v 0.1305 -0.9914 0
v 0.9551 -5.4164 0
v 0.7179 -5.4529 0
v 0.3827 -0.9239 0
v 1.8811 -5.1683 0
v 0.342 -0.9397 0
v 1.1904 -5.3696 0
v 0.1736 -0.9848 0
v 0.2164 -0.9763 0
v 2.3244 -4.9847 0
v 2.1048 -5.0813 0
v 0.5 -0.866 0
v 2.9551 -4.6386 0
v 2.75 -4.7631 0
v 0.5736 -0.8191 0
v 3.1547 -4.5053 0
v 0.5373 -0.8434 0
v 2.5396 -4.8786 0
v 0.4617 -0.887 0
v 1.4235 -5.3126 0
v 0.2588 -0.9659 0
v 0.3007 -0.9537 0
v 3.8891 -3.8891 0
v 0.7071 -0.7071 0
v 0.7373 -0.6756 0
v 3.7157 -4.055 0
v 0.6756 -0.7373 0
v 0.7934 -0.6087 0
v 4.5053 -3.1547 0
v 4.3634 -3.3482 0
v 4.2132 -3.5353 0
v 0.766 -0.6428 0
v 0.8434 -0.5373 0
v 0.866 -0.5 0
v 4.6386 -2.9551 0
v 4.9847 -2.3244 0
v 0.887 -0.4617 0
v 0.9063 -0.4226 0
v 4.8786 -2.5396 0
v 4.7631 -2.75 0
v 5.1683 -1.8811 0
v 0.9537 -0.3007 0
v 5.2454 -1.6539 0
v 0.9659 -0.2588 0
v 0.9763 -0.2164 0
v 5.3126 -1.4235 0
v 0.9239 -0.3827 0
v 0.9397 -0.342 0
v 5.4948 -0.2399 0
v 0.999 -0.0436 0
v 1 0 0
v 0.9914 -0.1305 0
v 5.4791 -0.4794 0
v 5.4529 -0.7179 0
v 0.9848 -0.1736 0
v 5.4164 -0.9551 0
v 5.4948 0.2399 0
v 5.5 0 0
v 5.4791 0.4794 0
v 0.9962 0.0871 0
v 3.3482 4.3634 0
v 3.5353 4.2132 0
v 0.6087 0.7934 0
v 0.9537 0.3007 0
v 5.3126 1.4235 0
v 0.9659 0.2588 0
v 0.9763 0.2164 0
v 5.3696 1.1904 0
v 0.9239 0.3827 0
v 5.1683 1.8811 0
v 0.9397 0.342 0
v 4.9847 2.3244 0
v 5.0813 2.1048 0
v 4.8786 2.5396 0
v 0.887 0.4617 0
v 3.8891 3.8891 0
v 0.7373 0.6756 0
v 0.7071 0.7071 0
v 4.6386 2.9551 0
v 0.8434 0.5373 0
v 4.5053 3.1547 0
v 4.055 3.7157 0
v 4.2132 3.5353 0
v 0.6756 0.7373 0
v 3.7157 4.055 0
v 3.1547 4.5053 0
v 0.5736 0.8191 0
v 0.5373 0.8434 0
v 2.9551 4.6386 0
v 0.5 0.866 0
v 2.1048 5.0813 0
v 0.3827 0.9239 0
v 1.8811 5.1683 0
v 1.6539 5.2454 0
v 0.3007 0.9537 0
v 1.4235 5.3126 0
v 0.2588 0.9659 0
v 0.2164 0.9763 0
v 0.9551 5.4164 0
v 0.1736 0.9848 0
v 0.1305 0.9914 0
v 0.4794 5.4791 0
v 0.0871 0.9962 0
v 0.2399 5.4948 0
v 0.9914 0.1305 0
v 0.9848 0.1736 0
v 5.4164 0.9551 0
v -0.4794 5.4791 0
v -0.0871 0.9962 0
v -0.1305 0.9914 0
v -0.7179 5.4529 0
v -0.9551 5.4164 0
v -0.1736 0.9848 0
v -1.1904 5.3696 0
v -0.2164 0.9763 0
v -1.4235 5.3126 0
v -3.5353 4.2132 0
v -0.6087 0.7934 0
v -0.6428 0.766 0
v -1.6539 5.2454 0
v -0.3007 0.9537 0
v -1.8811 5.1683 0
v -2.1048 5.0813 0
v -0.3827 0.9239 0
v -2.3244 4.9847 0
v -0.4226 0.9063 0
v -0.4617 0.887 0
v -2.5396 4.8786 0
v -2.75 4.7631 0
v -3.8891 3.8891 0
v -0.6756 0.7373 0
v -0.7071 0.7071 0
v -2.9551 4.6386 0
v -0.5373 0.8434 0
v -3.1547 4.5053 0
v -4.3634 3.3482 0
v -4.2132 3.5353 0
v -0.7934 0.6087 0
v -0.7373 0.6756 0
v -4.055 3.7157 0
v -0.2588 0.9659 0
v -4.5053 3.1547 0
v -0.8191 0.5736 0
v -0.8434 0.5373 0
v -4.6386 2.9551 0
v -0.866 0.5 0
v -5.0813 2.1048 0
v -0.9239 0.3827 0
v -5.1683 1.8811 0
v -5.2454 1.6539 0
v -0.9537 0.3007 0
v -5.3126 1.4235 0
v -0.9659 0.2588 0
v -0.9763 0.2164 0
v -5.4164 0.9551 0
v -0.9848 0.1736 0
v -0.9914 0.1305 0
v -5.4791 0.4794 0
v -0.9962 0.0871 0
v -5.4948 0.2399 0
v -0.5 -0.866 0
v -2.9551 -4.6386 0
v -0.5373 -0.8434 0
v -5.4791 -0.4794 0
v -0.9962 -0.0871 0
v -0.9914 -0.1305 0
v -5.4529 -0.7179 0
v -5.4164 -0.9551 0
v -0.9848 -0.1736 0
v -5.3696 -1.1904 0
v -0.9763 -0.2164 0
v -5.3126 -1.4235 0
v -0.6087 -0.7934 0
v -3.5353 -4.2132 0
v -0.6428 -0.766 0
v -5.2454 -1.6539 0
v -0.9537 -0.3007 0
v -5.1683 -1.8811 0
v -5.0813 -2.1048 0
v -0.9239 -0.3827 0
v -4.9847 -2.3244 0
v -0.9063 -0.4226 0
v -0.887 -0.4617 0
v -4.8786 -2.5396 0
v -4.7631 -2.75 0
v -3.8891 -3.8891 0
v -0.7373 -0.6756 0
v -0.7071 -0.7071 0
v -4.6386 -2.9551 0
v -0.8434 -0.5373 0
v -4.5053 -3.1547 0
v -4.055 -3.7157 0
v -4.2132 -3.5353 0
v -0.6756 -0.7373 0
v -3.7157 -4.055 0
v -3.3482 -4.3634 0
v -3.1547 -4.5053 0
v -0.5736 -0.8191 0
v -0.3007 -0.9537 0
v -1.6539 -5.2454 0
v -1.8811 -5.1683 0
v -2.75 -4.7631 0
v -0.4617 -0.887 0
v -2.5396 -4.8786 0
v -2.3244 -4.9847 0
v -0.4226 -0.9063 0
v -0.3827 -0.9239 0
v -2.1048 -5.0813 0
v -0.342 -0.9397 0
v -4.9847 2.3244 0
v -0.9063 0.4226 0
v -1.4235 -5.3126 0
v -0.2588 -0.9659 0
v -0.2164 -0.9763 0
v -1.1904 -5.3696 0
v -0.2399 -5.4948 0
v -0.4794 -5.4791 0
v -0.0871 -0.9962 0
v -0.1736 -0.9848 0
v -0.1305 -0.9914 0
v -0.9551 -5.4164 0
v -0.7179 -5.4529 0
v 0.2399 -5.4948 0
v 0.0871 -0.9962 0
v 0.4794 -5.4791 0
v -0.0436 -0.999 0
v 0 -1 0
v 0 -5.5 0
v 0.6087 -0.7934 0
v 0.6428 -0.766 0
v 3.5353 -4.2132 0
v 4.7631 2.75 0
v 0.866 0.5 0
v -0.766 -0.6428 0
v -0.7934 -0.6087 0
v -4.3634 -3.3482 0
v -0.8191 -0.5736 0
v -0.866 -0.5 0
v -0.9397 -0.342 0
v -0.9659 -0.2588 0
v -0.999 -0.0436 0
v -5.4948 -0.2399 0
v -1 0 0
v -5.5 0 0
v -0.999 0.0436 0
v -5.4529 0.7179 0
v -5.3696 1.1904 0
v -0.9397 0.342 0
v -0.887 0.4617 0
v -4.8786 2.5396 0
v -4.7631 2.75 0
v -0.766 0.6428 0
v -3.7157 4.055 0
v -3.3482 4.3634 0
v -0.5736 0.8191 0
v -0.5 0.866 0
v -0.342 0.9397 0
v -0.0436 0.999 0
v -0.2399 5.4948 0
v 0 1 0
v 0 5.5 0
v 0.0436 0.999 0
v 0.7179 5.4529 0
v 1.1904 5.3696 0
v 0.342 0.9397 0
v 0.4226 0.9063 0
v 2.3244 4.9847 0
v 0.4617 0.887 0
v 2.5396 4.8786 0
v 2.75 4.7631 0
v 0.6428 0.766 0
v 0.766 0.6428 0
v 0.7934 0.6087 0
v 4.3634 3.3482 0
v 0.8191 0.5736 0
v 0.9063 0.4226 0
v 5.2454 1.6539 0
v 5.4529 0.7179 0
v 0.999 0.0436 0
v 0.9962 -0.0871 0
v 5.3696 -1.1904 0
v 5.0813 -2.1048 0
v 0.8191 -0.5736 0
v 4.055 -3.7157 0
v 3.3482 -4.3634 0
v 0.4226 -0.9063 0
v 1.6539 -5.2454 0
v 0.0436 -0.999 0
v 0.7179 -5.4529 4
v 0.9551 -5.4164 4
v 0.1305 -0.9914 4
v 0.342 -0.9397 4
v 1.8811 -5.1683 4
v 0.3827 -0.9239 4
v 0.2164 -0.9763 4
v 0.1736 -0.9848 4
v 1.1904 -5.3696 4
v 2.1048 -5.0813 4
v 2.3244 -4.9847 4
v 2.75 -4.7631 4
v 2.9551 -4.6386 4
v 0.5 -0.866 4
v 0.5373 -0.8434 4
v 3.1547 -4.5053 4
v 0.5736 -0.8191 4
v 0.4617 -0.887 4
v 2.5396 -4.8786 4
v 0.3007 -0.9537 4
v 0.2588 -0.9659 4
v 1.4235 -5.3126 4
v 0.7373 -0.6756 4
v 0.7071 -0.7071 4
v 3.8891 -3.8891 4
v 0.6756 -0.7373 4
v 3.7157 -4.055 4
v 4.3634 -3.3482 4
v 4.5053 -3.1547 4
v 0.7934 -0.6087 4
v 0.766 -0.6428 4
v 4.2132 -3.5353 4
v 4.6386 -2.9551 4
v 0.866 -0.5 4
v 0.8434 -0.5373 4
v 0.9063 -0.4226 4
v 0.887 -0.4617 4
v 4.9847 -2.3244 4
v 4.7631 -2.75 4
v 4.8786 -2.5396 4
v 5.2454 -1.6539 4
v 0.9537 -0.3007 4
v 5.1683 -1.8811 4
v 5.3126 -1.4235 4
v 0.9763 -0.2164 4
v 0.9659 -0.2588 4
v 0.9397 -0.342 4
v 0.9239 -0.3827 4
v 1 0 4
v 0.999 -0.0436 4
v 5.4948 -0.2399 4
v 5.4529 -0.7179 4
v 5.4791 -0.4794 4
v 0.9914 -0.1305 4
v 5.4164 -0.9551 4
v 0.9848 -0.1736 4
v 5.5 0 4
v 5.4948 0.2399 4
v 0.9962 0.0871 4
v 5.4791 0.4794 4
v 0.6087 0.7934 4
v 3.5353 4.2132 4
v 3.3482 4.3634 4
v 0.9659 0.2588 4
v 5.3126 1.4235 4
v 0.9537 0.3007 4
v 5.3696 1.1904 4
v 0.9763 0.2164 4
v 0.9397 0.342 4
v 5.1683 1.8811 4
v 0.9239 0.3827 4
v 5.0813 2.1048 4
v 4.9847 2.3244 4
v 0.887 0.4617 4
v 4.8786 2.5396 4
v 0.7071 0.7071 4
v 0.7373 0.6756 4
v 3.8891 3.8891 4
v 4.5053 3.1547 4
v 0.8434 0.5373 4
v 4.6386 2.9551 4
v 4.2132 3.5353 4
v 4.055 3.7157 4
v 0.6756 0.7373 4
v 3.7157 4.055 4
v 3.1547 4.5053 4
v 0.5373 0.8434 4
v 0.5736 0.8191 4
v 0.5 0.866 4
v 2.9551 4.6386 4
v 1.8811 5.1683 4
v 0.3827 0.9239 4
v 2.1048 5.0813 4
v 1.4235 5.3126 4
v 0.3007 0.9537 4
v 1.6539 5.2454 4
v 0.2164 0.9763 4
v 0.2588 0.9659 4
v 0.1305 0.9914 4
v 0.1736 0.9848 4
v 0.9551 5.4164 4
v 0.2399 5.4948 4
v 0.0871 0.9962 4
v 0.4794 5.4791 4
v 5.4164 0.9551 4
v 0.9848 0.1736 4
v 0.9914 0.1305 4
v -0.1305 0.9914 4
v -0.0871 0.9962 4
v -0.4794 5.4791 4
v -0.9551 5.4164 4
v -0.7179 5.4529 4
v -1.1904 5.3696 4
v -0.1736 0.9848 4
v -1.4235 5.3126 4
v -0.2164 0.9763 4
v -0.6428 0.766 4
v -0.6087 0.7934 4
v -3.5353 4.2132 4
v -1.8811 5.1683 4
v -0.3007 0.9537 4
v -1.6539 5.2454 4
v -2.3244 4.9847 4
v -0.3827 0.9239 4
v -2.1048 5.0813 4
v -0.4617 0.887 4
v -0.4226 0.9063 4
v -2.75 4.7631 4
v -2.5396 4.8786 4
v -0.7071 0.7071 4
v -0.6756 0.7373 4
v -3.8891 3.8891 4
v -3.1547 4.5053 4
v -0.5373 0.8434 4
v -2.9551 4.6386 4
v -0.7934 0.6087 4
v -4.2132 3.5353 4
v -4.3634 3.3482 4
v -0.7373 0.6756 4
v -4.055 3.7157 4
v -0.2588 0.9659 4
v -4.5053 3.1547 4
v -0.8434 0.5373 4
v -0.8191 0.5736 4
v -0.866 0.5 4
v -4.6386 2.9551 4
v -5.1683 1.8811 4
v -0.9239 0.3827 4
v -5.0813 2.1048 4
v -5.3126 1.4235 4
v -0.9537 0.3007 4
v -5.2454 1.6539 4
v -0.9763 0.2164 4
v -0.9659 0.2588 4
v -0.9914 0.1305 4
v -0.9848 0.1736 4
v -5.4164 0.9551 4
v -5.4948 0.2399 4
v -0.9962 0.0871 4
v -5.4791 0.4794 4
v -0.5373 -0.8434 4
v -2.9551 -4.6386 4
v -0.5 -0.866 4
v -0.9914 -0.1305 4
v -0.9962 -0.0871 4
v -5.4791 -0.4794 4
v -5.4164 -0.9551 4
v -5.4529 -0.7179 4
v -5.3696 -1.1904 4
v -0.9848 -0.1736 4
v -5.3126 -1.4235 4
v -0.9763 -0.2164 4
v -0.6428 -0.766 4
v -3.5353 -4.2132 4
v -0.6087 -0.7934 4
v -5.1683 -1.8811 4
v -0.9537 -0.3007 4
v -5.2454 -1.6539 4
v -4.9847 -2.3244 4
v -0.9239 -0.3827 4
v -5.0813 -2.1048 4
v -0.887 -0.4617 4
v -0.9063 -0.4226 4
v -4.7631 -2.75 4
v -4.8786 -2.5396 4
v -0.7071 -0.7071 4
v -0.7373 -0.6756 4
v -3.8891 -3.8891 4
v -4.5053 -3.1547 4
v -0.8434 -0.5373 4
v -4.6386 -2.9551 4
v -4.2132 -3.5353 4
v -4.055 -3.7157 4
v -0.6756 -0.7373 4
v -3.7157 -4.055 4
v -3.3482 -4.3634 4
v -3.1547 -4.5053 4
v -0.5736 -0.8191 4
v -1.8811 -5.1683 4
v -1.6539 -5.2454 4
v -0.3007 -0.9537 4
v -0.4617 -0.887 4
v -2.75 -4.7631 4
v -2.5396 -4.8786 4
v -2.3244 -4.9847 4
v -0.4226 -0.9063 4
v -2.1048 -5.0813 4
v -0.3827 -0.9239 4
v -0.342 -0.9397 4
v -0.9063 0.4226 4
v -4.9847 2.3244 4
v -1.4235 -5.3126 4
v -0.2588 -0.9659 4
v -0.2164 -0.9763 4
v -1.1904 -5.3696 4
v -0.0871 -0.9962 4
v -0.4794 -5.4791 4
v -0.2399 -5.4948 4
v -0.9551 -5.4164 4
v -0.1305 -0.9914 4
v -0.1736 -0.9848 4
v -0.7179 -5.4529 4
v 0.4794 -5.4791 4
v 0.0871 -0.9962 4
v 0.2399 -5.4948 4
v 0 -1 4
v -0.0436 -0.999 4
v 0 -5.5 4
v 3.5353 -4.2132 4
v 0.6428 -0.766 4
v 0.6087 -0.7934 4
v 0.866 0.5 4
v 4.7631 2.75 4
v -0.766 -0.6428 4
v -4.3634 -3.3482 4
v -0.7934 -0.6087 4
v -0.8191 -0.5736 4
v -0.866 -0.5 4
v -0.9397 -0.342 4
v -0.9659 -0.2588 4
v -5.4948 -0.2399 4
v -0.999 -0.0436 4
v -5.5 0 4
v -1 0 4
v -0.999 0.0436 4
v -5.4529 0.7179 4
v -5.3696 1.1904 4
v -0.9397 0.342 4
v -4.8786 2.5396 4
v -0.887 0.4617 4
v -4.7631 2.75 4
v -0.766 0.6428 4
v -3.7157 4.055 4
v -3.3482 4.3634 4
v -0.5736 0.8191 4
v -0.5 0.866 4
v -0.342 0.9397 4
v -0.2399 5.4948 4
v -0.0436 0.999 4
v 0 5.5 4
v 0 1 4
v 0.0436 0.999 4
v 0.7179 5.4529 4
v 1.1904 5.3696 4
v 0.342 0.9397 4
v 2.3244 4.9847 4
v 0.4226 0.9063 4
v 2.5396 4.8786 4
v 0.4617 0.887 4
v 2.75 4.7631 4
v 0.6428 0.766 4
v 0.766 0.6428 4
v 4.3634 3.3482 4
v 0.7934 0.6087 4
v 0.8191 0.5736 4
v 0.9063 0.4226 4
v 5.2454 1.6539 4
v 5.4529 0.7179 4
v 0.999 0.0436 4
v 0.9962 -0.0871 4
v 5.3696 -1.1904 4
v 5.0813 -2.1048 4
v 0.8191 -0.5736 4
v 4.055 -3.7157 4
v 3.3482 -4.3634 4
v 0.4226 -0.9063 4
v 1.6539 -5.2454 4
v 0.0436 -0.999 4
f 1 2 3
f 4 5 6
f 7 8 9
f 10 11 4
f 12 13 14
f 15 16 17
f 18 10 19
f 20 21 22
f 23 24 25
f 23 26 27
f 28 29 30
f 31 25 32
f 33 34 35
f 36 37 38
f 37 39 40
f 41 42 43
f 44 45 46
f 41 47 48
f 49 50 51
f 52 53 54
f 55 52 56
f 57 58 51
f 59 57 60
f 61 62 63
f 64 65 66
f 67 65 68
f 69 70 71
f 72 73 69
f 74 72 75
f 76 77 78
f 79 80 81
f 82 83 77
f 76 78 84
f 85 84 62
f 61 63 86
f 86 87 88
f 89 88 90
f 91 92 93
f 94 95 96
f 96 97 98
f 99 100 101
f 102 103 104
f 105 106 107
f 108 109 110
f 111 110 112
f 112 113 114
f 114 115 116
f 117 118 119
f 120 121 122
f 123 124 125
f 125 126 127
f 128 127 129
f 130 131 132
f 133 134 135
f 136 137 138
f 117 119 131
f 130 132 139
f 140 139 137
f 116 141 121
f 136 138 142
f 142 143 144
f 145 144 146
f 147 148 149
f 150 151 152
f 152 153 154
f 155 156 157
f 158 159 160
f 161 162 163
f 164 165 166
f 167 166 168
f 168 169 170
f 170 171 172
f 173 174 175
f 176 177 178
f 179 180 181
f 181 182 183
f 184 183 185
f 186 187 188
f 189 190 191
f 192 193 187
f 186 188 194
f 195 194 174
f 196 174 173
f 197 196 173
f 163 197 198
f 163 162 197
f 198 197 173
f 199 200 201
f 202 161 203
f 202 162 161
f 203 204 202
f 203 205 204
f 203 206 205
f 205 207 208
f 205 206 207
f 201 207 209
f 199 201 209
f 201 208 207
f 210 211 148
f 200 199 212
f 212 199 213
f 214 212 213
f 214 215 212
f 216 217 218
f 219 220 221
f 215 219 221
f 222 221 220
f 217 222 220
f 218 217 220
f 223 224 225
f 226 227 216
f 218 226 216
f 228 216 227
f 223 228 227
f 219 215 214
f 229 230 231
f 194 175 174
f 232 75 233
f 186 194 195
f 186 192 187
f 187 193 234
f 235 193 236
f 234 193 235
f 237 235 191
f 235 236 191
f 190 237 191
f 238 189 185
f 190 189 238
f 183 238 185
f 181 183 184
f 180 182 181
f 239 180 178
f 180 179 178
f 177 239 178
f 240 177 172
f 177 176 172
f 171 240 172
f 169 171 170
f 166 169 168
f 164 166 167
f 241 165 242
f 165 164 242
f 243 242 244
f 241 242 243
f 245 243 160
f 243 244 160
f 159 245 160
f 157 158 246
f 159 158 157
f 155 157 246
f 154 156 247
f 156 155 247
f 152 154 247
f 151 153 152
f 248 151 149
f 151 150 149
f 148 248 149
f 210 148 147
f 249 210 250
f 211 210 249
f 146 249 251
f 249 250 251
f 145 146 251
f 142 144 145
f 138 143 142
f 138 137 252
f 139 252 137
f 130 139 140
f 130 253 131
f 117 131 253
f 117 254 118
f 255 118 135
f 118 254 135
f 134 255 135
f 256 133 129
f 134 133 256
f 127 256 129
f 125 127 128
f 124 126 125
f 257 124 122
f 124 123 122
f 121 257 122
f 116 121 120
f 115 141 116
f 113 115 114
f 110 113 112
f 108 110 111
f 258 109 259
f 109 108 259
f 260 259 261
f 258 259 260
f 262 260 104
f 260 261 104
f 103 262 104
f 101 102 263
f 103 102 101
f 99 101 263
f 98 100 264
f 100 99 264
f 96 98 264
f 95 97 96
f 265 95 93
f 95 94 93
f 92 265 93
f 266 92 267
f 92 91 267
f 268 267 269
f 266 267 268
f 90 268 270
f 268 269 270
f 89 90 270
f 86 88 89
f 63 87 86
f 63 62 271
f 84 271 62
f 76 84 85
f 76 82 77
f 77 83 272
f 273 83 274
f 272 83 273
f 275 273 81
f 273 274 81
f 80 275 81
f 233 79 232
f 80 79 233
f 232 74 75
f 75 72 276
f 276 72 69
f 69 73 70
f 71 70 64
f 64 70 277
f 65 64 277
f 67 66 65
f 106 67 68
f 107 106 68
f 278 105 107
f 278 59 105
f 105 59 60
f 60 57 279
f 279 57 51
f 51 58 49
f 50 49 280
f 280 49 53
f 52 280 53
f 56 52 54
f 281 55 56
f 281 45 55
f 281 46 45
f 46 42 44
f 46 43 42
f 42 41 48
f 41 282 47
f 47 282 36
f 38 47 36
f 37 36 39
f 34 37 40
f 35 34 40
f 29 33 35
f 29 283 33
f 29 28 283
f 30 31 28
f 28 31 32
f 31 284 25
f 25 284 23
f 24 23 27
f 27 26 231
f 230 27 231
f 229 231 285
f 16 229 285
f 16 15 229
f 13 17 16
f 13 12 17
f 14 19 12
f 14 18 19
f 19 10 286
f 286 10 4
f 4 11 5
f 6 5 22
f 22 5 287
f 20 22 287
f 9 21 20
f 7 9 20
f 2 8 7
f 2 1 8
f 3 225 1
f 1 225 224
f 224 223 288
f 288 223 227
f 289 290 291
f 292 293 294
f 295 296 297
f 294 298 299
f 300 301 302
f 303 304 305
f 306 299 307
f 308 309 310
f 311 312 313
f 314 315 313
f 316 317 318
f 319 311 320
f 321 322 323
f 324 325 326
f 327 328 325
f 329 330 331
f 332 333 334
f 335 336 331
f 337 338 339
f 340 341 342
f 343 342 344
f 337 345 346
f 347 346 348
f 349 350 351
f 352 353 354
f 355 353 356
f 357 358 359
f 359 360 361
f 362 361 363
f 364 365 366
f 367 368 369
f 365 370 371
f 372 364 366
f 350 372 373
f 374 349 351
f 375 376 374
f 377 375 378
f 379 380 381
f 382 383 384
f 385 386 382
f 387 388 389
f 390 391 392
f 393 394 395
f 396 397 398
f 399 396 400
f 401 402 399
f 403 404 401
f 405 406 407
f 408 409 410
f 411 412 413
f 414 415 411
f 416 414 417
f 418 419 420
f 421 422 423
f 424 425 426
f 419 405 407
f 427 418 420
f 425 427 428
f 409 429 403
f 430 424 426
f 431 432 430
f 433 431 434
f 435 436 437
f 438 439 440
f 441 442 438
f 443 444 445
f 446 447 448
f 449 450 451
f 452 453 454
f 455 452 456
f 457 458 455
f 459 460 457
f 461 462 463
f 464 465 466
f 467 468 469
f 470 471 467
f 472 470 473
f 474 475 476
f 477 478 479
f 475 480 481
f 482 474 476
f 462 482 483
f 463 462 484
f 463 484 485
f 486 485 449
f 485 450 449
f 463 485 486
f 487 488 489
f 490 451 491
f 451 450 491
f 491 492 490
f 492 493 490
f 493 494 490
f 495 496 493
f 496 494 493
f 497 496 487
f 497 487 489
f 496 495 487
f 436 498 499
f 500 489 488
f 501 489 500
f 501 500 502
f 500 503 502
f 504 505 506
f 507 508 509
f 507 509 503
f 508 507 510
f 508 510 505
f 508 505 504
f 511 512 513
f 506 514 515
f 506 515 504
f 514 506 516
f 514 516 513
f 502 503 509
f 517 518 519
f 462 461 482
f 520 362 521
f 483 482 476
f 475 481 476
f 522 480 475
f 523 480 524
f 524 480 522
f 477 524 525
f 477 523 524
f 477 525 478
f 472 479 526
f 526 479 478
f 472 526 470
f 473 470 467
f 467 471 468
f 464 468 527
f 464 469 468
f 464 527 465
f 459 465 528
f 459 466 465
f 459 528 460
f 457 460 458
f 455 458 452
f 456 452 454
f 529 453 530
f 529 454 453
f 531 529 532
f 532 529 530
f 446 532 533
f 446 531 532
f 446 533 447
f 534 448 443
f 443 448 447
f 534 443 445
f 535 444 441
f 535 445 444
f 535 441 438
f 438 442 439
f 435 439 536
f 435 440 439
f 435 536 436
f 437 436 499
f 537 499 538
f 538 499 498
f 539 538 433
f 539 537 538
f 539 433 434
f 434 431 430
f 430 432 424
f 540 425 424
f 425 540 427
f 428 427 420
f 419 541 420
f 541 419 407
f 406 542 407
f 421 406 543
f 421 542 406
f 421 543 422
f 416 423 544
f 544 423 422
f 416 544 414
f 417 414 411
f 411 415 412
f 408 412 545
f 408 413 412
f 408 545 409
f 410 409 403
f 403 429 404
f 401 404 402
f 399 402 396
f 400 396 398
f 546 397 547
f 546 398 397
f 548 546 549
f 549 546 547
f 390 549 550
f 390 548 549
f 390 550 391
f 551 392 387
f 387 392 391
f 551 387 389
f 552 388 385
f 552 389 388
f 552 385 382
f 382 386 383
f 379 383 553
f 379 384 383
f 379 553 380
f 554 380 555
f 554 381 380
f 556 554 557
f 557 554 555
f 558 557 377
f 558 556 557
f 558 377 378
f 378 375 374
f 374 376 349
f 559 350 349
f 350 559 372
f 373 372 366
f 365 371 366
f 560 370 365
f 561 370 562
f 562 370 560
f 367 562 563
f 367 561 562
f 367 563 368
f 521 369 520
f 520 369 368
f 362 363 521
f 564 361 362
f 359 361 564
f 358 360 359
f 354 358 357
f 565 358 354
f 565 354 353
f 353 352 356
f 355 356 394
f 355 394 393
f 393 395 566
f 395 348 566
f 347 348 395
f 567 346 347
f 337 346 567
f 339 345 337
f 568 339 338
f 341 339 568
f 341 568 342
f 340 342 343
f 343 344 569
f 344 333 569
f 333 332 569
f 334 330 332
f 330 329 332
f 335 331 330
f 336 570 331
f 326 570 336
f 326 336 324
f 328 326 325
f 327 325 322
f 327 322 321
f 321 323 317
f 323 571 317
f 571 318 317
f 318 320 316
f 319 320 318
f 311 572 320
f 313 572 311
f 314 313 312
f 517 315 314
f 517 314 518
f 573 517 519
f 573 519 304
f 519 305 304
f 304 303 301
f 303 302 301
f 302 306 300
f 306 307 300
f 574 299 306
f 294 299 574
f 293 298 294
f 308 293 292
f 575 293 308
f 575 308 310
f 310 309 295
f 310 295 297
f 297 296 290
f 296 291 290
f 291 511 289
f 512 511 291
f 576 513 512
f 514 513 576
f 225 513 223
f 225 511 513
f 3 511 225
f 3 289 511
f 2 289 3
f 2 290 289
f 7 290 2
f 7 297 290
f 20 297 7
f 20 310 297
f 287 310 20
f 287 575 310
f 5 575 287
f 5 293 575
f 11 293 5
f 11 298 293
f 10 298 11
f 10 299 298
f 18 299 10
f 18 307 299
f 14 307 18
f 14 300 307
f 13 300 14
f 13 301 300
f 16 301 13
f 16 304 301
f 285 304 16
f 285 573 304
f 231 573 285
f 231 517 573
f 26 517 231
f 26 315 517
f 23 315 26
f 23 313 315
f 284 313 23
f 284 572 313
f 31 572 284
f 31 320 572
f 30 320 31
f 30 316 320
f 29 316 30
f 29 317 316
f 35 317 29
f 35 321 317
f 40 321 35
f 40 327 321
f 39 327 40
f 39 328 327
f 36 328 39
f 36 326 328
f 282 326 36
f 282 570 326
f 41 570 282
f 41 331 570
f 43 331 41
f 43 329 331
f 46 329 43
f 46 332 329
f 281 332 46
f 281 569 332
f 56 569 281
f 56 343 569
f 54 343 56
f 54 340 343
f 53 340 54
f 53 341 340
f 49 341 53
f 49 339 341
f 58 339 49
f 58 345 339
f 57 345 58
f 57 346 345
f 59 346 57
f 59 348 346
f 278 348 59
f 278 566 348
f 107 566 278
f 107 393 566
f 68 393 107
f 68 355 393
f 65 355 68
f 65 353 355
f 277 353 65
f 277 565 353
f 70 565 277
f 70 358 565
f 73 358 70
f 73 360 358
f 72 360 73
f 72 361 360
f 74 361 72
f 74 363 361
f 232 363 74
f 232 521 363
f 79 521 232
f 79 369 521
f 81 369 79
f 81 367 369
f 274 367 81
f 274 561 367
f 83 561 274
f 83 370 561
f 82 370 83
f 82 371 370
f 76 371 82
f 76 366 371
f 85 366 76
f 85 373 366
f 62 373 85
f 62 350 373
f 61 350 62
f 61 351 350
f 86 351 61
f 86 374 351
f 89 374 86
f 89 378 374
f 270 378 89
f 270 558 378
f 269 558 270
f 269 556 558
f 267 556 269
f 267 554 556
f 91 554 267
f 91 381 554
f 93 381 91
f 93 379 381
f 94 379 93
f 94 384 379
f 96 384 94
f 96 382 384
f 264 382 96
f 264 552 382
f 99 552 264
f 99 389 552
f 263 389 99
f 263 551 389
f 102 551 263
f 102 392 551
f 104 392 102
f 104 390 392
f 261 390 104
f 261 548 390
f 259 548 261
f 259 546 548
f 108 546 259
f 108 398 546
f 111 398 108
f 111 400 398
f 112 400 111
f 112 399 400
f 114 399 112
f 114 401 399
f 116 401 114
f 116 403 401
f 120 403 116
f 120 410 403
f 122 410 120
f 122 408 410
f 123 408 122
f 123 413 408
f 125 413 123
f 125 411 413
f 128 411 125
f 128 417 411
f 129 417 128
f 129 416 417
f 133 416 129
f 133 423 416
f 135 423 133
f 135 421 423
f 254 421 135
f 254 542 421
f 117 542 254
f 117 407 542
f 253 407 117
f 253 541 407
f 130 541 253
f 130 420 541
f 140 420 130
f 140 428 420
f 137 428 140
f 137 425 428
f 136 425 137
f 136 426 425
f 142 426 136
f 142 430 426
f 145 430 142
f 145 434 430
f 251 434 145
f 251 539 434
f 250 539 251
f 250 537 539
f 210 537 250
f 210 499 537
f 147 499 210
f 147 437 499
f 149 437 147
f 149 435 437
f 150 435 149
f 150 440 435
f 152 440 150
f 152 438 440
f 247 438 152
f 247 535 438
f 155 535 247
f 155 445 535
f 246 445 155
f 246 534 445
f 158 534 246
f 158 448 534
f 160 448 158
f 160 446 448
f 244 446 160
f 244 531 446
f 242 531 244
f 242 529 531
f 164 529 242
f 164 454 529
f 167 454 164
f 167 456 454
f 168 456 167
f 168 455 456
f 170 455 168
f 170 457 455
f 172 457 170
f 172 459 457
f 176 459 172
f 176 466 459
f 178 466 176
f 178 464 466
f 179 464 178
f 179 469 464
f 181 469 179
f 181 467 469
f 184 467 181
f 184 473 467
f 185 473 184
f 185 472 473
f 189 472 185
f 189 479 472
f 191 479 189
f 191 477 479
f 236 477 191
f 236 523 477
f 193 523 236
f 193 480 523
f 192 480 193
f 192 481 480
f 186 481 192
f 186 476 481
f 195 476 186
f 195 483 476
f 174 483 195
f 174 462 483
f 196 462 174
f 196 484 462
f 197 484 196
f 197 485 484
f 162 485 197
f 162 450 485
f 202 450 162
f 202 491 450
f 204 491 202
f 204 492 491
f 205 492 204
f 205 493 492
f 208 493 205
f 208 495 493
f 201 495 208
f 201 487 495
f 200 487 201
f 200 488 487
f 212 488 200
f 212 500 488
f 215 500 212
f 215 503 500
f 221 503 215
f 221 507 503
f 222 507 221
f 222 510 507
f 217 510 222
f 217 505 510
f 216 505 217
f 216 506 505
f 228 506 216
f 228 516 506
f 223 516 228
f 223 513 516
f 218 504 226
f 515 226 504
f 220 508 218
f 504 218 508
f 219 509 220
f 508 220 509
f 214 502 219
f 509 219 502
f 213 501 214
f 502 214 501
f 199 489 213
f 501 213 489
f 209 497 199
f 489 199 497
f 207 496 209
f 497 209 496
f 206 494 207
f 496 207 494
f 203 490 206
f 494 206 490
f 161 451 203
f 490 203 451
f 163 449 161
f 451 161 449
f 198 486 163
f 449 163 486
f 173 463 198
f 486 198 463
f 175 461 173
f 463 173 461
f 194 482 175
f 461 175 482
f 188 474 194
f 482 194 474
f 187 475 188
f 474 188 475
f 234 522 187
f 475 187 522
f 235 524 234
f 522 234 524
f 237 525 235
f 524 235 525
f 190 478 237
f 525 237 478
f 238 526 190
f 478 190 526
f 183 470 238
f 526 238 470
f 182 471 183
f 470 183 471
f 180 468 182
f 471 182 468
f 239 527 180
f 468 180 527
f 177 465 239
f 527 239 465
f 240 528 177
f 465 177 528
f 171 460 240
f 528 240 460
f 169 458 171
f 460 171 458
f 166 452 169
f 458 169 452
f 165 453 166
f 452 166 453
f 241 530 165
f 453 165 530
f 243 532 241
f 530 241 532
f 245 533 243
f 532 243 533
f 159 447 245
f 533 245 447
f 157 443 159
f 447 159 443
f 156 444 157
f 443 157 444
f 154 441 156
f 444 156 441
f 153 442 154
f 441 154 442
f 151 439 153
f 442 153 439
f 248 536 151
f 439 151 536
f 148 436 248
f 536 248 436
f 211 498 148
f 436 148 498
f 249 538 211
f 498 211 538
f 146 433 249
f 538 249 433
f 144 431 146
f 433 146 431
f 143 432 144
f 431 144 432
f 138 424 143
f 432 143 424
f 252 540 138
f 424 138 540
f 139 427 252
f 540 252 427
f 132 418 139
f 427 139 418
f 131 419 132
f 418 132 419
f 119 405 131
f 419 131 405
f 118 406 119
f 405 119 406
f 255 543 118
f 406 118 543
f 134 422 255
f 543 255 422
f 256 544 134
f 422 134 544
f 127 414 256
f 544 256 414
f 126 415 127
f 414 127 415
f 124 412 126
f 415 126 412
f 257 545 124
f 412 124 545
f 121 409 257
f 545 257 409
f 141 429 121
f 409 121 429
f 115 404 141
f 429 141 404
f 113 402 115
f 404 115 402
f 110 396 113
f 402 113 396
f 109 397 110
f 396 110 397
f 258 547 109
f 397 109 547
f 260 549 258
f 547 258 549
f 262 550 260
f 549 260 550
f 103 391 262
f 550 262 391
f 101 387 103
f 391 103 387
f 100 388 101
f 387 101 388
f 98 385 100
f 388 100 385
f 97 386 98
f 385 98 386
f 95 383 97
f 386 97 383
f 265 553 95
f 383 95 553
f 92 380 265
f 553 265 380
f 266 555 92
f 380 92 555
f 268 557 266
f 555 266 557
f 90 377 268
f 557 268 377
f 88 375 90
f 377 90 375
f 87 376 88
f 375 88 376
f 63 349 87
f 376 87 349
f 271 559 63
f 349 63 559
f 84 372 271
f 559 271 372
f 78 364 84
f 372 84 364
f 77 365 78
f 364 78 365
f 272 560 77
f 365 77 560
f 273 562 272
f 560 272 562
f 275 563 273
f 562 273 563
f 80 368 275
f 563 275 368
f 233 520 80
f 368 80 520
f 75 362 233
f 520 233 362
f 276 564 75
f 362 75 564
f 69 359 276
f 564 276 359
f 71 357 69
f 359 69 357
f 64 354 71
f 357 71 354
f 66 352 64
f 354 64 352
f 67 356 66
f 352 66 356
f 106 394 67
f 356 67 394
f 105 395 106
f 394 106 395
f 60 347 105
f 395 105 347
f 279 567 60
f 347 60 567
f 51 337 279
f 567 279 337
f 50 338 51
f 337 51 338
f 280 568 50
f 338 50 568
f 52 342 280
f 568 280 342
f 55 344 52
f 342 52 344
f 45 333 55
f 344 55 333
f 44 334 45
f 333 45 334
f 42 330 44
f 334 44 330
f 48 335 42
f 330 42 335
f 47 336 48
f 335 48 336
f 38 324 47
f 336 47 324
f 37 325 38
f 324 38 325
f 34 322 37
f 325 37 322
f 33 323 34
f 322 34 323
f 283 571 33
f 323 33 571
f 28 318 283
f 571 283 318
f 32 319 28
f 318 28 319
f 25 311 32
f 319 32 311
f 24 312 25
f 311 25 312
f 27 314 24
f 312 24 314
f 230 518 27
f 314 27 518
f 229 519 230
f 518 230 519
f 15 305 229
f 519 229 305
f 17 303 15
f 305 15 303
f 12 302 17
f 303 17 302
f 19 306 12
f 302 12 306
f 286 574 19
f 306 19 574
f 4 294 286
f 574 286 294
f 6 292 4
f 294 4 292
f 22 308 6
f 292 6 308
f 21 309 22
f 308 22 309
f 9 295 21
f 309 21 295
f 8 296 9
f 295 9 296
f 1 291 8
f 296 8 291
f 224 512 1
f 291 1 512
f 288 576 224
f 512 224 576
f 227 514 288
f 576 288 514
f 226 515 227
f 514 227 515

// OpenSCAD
// file: ../print_fit.scad
// Print-fit clearances, shared by every printed part's `config="revised"`.
//
// A printed part comes off the machine slightly oversize, so a feature drawn
// line-to-line against what it mates with will not go together. Each mating
// feature is drawn at its mate's nominal size plus or minus one of two
// clearances, per side, chosen by what the mate is:
//
//     FIT_PRESS    a bought part the printed one is seated on, located by
//                  or bonded to: bearings, motors, splines, CF rods, tubes
//                  and strakes
//     FIT_SLIP     another printed part, and every fastener's clearance:
//                  screw holes, nut traps and pockets
//
// A third class is not a fit, because its surfaces never meet:
//
//     FIT_RUN      a gap between two parts that turn past each other and
//                  must never touch, such as a housing and a gear's teeth
//
// A fourth class is drawn under its mate's size, not over it:
//
//     FIT_TAP      a pilot a screw cuts its own thread into, drawn as
//                  fit_pin(the screw's nominal, FIT_TAP)
//
// The classes, their members and exclusions, and how a machine is qualified
// against these values are owned by specs/007.2 § Print fits; the coupon that
// qualifies them is 950-Tooling/fit_coupon.scad.
//
// Every part `include`s this file, so `-D FIT_SLIP=...` reaches a single
// render, and an edit here retunes every part. `config="previous"` draws at
// zero clearance: it is the reference mesh, and its dist gate measures it.

FIT_SLIP  = 0.15;
FIT_PRESS = 0.05;
FIT_RUN   = 0.50;
FIT_TAP   = 0.20;

// A hole or bore that takes a mate of diameter d, and a pin or shaft that
// goes into one, with clearance c per side.
function fit_bore(d, c) = d + 2 * c;
function fit_pin(d, c) = d - 2 * c;

// The clearances a part draws in configuration cfg: [slip, press, run, tap].
function fit_clearances(cfg) =
    cfg == "previous" ? [0, 0, 0, 0] : [FIT_SLIP, FIT_PRESS, FIT_RUN, FIT_TAP];
// main file
// #930-002 Finger Cap — parametric source.
// A plain washer-like disc: Ø11 × 4 with a Ø2 hole on its axis, for an M2 bolt into the Claw Finger's
// shaft end. Published as the legacy `920-003_FingerCap.stl`.
//
//   config = "previous" — a faithful recreation of the reference mesh
//                         (../Reference/meshes/930-ClawGripper/930-002_FingerCap.stl), in that mesh's
//                         frame. There is no STEP or f3d of this part.
//   config = "revised"  — the same disc with H1 opened to the M2 bolt's slip clearance.
//
// FRAME. The reference's own: the axis on +Z through the origin, the underside at z = 0.
//
// Measured from the reference with scadmesh planes/radial/slice. The feature IDs are those of
// 930-002_FingerCap.view.json:
//
//     ID  feature  value    z span
//     D1  disc     Ø11.000  0 .. 4
//     H1  hole     Ø2.000   through
//
// FITS (revised). H1 takes an M2 bolt: fit_bore(2, FIT_SLIP) = Ø2.300.

include <../print_fit.scad>

/* [Configuration] */
// Parameter set: previous (reference) or revised
config = "previous"; // [previous, revised]
// What to draw: the part, or its 2D section for the outline gate
layer = "part"; // [part, D1]

/* [Hidden] */
$fn = 144;

DISC   = [11.000, 4.000];   // diameter, height
BOLT_D = 2.000;             // M2, the reference's H1

module section_2d(cfg = config)
    let(c = fit_clearances(cfg))
    difference() {
        circle(d = DISC[0]);
        circle(d = fit_bore(BOLT_D, c[0]));
    }

module finger_cap(cfg = config) linear_extrude(DISC[1]) section_2d(cfg);

if (layer == "D1") section_2d();
else finger_cap();
